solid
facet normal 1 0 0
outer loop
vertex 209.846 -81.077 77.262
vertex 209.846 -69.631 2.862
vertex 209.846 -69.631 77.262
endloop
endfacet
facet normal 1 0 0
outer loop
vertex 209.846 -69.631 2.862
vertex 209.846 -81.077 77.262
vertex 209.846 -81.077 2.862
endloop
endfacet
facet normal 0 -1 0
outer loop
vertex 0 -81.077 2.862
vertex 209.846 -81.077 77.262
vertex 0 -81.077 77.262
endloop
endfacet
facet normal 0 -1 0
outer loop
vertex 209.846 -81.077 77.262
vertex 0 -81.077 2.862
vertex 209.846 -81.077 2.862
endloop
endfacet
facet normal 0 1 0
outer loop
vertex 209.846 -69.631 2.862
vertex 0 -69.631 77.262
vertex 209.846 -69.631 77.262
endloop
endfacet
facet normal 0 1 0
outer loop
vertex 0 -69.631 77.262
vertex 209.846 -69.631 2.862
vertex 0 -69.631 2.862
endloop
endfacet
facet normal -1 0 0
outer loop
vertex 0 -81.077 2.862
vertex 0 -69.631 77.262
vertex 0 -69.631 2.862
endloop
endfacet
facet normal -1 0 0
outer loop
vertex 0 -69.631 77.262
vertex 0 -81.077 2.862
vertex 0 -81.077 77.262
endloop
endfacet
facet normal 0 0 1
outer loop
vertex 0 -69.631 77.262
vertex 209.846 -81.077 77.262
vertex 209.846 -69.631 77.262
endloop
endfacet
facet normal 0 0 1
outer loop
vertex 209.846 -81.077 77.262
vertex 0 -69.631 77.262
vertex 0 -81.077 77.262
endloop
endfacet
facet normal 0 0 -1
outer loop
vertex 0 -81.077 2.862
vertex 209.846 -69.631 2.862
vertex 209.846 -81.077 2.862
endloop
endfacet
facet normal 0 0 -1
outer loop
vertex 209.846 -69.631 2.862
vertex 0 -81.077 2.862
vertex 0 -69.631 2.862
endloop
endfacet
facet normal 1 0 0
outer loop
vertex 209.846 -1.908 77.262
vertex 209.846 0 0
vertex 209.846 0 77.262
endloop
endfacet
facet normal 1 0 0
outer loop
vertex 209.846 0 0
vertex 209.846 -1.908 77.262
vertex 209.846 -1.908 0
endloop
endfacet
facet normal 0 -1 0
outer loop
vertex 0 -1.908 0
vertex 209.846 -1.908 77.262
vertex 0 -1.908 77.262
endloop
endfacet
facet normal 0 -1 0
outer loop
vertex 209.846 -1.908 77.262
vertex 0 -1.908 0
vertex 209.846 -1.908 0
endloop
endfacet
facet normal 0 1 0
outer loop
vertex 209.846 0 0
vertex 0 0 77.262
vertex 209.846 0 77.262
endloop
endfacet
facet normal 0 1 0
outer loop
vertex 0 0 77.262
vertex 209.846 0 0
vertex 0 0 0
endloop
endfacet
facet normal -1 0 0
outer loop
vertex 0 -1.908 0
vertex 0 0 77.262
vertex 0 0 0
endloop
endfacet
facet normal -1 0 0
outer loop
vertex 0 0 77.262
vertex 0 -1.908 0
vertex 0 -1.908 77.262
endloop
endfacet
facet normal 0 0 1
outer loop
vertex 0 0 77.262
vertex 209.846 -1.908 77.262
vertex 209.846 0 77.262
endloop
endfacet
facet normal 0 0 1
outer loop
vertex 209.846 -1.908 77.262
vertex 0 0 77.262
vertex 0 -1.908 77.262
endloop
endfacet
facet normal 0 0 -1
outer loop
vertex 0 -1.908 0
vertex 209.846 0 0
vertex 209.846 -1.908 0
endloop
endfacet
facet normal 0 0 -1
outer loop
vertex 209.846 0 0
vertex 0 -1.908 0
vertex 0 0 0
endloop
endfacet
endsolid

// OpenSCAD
/* WEYLAND-YUTANI CORP espresso cups holder
 * (C) 2017 by Pascal Bauermeister
 */

LENGTH = 220;
HEIGHT = 83;
WIDTH = 81;
RECESS = 3; // 5 is too deep
CUP_DIAMETER = 62; // in mm

RATIO = CUP_DIAMETER / 65;
scale(RATIO)
rotate([90, 0, 0])
all();

module main() {
    if(1)
    translate([0, WIDTH, 0])
    rotate([90, 0, 0])
    scale([10, 10, WIDTH/100])
    linear_extrude(h=1)
    import("logo.dxf");

       
    translate([0, RECESS, HEIGHT-12])
    cube([LENGTH, WIDTH - RECESS, 12]);    
}

module side_cut() {
    translate([0, WIDTH, 0])
    rotate([90, 0, 0])
    scale([10, 10, WIDTH/100])
    linear_extrude(h=1)
    import("side-cut.dxf");
}

module cavity() {
    scale([10, 10, HEIGHT/100+1])
    linear_extrude(h=1)
    import("cavity.dxf");
}

module wall() {
    scale([10, 10, HEIGHT/100])
    linear_extrude(h=1)
    import("wall.dxf");
}

module all() {
    translate([0, 0, 2])
    difference() {
        union() {
            difference() {
                main();
               cavity();
            }
            wall();
        }
        side_cut();
    }

    cube([LENGTH, WIDTH, 2]);
}
